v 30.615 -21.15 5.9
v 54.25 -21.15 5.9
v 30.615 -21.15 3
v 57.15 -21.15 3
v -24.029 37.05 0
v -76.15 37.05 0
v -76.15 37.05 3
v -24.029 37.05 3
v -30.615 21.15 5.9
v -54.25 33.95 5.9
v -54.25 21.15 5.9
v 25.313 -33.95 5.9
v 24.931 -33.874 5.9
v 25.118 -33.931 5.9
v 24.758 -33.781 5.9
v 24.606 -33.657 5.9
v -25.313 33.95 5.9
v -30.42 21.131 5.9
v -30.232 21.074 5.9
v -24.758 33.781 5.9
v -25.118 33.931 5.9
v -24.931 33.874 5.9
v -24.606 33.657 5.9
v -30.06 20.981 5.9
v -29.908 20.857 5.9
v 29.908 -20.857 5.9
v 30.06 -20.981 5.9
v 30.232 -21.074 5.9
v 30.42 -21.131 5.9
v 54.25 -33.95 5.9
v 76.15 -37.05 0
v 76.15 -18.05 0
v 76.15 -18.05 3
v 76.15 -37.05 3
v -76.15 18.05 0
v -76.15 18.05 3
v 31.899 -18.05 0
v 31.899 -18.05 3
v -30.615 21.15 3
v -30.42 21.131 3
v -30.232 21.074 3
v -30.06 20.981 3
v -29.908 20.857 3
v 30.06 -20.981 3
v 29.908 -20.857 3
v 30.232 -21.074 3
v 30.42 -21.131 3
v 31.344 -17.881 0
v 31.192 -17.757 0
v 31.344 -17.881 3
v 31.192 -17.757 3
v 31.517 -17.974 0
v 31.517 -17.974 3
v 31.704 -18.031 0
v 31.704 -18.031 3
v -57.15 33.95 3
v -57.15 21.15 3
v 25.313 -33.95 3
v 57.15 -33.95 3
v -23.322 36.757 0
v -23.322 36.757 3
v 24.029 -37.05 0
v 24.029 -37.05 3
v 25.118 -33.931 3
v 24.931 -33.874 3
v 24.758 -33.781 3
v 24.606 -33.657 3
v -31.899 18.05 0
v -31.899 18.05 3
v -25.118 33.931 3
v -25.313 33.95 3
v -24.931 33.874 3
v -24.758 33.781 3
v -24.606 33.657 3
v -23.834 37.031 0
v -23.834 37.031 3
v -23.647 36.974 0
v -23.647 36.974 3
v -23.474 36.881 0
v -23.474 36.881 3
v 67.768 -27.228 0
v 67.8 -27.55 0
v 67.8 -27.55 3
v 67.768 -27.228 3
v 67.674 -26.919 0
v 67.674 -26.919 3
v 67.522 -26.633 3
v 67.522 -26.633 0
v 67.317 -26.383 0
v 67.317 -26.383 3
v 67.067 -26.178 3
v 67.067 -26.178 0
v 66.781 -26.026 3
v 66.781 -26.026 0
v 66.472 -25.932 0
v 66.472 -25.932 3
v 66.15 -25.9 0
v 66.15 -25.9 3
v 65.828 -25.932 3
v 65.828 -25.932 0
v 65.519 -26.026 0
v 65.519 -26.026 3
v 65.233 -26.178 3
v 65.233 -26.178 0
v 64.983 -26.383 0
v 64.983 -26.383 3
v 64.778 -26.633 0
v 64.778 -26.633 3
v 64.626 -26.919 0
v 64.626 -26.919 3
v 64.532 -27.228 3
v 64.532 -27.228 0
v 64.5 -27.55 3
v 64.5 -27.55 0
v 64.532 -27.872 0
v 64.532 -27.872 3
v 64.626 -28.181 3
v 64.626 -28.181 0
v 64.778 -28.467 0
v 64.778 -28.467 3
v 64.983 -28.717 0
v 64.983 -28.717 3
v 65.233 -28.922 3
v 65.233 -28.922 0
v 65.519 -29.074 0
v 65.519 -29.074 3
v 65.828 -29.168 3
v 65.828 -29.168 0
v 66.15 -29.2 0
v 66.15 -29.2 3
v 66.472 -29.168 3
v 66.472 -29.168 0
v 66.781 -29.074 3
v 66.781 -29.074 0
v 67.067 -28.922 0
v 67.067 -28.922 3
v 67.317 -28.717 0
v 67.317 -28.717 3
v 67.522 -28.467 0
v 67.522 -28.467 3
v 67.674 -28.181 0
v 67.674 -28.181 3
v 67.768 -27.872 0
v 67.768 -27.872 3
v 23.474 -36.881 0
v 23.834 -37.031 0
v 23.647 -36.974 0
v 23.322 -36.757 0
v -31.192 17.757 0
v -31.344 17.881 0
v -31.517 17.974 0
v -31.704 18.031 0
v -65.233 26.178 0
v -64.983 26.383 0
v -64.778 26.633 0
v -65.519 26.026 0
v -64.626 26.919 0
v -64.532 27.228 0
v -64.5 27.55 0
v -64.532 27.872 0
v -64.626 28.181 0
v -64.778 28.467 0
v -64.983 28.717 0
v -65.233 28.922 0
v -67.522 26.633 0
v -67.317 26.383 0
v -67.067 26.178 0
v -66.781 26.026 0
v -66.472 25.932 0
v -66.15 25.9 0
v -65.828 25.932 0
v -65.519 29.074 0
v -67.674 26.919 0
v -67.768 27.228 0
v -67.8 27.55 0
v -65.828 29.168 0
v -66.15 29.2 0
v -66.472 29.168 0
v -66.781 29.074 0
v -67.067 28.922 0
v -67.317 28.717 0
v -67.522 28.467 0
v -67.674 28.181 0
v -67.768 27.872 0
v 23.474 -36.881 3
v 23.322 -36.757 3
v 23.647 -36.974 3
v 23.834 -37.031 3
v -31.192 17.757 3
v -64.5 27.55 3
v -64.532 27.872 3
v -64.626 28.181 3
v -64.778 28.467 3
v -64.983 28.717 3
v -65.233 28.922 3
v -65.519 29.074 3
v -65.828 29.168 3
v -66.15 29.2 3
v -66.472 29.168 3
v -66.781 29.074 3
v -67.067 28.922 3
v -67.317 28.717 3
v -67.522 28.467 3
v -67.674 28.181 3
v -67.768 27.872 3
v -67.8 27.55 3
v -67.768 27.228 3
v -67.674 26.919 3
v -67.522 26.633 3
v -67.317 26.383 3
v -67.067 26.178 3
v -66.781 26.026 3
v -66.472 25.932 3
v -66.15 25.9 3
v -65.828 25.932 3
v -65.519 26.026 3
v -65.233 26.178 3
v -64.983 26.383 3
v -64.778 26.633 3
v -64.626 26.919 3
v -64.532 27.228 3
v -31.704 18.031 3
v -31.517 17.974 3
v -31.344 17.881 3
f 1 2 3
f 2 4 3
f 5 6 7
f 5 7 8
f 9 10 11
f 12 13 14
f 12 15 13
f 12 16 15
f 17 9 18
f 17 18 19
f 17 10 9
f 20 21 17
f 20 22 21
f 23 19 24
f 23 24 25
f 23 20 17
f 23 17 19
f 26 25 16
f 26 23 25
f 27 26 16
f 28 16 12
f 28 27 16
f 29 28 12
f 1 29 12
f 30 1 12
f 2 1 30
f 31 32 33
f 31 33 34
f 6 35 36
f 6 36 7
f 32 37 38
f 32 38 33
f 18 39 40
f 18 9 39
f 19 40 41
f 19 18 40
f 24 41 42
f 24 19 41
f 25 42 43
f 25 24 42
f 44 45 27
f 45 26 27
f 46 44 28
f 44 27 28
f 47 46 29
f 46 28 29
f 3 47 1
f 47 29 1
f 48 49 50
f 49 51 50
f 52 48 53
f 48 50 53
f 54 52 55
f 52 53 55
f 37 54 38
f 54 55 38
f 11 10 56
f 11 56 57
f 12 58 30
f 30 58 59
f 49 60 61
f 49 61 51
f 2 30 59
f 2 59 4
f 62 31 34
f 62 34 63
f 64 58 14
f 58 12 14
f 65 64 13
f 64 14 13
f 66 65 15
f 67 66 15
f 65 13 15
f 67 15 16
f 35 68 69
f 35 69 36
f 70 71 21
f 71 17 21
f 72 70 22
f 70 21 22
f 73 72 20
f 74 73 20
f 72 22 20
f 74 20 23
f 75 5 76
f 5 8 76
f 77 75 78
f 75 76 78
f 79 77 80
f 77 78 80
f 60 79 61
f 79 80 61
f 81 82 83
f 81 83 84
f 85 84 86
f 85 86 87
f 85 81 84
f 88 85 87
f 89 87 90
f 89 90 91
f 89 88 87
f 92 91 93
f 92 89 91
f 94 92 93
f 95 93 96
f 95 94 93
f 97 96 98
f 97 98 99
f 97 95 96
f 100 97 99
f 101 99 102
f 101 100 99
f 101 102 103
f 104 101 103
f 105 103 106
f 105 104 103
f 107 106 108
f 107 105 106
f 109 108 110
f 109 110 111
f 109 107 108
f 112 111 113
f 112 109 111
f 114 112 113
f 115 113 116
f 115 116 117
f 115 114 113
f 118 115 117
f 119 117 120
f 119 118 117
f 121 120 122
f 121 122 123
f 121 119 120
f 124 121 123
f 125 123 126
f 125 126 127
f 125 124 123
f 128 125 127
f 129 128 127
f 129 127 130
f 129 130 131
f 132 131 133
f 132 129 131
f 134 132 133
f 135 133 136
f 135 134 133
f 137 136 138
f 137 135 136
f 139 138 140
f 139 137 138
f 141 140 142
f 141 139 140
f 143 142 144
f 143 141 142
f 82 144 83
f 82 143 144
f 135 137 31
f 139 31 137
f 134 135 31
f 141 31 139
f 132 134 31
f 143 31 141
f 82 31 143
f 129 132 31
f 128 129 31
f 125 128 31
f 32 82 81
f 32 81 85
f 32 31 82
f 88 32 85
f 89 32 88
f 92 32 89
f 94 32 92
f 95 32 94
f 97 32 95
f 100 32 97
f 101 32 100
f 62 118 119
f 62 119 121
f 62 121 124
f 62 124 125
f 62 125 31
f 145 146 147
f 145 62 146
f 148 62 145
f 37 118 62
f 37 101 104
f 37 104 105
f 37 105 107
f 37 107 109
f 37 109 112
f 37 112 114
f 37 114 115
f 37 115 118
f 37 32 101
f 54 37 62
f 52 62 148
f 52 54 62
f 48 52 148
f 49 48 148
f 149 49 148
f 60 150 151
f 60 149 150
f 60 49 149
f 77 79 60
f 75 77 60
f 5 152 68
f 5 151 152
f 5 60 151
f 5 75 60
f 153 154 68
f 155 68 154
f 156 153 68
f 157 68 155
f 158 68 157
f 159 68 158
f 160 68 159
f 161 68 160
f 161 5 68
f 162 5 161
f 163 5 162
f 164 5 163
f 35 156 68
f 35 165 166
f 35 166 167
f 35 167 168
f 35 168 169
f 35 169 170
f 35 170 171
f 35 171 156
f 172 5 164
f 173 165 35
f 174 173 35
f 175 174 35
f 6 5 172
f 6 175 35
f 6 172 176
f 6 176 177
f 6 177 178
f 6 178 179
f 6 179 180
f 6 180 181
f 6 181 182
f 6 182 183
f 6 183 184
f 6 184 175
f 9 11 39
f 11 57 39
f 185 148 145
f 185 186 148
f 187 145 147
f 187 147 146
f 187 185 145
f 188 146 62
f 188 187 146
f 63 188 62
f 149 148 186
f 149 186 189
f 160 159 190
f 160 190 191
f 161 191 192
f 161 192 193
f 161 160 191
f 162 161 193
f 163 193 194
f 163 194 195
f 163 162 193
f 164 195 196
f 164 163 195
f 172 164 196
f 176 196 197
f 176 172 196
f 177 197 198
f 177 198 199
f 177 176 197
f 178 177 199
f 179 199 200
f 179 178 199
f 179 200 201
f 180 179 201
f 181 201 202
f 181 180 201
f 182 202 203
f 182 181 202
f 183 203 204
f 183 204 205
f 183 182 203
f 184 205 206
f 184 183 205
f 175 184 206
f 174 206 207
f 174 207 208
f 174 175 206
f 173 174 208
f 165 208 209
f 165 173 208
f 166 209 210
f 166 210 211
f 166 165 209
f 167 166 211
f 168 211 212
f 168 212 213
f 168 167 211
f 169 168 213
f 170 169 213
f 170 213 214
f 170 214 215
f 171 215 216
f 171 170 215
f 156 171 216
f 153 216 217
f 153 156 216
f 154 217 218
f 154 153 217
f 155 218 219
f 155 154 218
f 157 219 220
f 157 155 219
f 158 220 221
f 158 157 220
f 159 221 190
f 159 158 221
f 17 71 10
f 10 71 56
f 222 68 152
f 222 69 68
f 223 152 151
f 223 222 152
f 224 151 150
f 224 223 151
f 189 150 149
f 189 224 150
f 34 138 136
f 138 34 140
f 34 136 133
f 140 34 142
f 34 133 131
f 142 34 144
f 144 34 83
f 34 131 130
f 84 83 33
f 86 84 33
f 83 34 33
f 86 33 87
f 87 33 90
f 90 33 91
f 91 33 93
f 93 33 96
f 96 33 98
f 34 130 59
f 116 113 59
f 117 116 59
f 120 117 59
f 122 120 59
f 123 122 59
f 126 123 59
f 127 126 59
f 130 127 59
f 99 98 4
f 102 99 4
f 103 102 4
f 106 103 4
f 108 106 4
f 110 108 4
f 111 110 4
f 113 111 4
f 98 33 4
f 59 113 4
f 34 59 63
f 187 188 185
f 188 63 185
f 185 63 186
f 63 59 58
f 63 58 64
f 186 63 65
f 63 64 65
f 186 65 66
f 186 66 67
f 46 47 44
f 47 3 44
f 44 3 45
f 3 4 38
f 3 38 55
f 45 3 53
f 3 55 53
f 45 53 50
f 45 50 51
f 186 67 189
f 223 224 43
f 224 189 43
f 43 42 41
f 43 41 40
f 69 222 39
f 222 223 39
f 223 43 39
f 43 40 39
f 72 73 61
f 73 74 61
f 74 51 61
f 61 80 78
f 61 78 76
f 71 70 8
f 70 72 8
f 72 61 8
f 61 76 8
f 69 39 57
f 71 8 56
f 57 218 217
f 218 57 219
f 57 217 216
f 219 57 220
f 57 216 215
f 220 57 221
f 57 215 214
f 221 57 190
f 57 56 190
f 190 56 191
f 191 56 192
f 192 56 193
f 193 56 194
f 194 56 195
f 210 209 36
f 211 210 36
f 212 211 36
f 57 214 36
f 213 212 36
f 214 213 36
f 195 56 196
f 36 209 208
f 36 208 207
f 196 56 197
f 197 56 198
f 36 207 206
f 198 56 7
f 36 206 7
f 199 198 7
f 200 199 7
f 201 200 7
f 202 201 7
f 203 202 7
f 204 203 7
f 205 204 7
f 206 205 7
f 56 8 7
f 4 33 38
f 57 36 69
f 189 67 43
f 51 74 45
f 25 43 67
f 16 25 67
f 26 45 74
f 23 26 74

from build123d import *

# Parameters (mm, degrees)
SKETCH_1_R      = 1.65
EXTRUDE_1_DEPTH = 3
EXTRUDE_2_DEPTH = 2.9
CHAMFER_1_SIZE  = 2.9
FILLET_1_R      = 1


with BuildPart() as part:
    # 草图1 → 凸台-拉伸1 (new body)
    with BuildSketch(Plane.XY):
        Polygon((-76.15, 37.05), (-23.614971157, 37.05), (31.485028843, -18.05), (76.15, -18.05), (76.15, -37.05), (23.614971157, -37.05), (-31.485028843, 18.05), (-76.15, 18.05), align=None)
        with Locations((-66.15, 27.55)):
            Circle(SKETCH_1_R, mode=Mode.SUBTRACT)
        with Locations((66.15, -27.55)):
            Circle(SKETCH_1_R, mode=Mode.SUBTRACT)
    extrude(amount=EXTRUDE_1_DEPTH)

    # 草图2 → 凸台-拉伸2 (add)
    with BuildSketch(Plane.XY.offset(3)):
        Polygon((-57.15, 33.95), (-57.15, 21.15), (-30.200966799, 21.15), (24.899033201, -33.95), (57.15, -33.95), (57.15, -21.15), (30.200966799, -21.15), (-24.899033201, 33.95), align=None)
    extrude(amount=EXTRUDE_2_DEPTH)

    # 倒角1
    chamfer_1_edges = [part.edges().sort_by_distance(p)[0] for p in [
        (57.15, -27.55, 5.9),
        (-57.15, 27.55, 5.9),
    ]]
    chamfer(chamfer_1_edges, length=CHAMFER_1_SIZE - 0.0001)  # a hair under: the kernel refuses the full size

    # 圆角1
    fillet_1_edges = [part.edges().sort_by_distance(p)[0] for p in [
        (-23.614971157, 37.05, 1.5),
        (31.485028843, -18.05, 1.5),
        (23.614971157, -37.05, 1.5),
        (-31.485028843, 18.05, 1.5),
        (-24.899033201, 33.95, 4.45),
        (-30.200966799, 21.15, 4.45),
        (24.899033201, -33.95, 4.45),
        (30.200966799, -21.15, 4.45),
    ]]
    fillet(fillet_1_edges, radius=FILLET_1_R)


solid = part.part
